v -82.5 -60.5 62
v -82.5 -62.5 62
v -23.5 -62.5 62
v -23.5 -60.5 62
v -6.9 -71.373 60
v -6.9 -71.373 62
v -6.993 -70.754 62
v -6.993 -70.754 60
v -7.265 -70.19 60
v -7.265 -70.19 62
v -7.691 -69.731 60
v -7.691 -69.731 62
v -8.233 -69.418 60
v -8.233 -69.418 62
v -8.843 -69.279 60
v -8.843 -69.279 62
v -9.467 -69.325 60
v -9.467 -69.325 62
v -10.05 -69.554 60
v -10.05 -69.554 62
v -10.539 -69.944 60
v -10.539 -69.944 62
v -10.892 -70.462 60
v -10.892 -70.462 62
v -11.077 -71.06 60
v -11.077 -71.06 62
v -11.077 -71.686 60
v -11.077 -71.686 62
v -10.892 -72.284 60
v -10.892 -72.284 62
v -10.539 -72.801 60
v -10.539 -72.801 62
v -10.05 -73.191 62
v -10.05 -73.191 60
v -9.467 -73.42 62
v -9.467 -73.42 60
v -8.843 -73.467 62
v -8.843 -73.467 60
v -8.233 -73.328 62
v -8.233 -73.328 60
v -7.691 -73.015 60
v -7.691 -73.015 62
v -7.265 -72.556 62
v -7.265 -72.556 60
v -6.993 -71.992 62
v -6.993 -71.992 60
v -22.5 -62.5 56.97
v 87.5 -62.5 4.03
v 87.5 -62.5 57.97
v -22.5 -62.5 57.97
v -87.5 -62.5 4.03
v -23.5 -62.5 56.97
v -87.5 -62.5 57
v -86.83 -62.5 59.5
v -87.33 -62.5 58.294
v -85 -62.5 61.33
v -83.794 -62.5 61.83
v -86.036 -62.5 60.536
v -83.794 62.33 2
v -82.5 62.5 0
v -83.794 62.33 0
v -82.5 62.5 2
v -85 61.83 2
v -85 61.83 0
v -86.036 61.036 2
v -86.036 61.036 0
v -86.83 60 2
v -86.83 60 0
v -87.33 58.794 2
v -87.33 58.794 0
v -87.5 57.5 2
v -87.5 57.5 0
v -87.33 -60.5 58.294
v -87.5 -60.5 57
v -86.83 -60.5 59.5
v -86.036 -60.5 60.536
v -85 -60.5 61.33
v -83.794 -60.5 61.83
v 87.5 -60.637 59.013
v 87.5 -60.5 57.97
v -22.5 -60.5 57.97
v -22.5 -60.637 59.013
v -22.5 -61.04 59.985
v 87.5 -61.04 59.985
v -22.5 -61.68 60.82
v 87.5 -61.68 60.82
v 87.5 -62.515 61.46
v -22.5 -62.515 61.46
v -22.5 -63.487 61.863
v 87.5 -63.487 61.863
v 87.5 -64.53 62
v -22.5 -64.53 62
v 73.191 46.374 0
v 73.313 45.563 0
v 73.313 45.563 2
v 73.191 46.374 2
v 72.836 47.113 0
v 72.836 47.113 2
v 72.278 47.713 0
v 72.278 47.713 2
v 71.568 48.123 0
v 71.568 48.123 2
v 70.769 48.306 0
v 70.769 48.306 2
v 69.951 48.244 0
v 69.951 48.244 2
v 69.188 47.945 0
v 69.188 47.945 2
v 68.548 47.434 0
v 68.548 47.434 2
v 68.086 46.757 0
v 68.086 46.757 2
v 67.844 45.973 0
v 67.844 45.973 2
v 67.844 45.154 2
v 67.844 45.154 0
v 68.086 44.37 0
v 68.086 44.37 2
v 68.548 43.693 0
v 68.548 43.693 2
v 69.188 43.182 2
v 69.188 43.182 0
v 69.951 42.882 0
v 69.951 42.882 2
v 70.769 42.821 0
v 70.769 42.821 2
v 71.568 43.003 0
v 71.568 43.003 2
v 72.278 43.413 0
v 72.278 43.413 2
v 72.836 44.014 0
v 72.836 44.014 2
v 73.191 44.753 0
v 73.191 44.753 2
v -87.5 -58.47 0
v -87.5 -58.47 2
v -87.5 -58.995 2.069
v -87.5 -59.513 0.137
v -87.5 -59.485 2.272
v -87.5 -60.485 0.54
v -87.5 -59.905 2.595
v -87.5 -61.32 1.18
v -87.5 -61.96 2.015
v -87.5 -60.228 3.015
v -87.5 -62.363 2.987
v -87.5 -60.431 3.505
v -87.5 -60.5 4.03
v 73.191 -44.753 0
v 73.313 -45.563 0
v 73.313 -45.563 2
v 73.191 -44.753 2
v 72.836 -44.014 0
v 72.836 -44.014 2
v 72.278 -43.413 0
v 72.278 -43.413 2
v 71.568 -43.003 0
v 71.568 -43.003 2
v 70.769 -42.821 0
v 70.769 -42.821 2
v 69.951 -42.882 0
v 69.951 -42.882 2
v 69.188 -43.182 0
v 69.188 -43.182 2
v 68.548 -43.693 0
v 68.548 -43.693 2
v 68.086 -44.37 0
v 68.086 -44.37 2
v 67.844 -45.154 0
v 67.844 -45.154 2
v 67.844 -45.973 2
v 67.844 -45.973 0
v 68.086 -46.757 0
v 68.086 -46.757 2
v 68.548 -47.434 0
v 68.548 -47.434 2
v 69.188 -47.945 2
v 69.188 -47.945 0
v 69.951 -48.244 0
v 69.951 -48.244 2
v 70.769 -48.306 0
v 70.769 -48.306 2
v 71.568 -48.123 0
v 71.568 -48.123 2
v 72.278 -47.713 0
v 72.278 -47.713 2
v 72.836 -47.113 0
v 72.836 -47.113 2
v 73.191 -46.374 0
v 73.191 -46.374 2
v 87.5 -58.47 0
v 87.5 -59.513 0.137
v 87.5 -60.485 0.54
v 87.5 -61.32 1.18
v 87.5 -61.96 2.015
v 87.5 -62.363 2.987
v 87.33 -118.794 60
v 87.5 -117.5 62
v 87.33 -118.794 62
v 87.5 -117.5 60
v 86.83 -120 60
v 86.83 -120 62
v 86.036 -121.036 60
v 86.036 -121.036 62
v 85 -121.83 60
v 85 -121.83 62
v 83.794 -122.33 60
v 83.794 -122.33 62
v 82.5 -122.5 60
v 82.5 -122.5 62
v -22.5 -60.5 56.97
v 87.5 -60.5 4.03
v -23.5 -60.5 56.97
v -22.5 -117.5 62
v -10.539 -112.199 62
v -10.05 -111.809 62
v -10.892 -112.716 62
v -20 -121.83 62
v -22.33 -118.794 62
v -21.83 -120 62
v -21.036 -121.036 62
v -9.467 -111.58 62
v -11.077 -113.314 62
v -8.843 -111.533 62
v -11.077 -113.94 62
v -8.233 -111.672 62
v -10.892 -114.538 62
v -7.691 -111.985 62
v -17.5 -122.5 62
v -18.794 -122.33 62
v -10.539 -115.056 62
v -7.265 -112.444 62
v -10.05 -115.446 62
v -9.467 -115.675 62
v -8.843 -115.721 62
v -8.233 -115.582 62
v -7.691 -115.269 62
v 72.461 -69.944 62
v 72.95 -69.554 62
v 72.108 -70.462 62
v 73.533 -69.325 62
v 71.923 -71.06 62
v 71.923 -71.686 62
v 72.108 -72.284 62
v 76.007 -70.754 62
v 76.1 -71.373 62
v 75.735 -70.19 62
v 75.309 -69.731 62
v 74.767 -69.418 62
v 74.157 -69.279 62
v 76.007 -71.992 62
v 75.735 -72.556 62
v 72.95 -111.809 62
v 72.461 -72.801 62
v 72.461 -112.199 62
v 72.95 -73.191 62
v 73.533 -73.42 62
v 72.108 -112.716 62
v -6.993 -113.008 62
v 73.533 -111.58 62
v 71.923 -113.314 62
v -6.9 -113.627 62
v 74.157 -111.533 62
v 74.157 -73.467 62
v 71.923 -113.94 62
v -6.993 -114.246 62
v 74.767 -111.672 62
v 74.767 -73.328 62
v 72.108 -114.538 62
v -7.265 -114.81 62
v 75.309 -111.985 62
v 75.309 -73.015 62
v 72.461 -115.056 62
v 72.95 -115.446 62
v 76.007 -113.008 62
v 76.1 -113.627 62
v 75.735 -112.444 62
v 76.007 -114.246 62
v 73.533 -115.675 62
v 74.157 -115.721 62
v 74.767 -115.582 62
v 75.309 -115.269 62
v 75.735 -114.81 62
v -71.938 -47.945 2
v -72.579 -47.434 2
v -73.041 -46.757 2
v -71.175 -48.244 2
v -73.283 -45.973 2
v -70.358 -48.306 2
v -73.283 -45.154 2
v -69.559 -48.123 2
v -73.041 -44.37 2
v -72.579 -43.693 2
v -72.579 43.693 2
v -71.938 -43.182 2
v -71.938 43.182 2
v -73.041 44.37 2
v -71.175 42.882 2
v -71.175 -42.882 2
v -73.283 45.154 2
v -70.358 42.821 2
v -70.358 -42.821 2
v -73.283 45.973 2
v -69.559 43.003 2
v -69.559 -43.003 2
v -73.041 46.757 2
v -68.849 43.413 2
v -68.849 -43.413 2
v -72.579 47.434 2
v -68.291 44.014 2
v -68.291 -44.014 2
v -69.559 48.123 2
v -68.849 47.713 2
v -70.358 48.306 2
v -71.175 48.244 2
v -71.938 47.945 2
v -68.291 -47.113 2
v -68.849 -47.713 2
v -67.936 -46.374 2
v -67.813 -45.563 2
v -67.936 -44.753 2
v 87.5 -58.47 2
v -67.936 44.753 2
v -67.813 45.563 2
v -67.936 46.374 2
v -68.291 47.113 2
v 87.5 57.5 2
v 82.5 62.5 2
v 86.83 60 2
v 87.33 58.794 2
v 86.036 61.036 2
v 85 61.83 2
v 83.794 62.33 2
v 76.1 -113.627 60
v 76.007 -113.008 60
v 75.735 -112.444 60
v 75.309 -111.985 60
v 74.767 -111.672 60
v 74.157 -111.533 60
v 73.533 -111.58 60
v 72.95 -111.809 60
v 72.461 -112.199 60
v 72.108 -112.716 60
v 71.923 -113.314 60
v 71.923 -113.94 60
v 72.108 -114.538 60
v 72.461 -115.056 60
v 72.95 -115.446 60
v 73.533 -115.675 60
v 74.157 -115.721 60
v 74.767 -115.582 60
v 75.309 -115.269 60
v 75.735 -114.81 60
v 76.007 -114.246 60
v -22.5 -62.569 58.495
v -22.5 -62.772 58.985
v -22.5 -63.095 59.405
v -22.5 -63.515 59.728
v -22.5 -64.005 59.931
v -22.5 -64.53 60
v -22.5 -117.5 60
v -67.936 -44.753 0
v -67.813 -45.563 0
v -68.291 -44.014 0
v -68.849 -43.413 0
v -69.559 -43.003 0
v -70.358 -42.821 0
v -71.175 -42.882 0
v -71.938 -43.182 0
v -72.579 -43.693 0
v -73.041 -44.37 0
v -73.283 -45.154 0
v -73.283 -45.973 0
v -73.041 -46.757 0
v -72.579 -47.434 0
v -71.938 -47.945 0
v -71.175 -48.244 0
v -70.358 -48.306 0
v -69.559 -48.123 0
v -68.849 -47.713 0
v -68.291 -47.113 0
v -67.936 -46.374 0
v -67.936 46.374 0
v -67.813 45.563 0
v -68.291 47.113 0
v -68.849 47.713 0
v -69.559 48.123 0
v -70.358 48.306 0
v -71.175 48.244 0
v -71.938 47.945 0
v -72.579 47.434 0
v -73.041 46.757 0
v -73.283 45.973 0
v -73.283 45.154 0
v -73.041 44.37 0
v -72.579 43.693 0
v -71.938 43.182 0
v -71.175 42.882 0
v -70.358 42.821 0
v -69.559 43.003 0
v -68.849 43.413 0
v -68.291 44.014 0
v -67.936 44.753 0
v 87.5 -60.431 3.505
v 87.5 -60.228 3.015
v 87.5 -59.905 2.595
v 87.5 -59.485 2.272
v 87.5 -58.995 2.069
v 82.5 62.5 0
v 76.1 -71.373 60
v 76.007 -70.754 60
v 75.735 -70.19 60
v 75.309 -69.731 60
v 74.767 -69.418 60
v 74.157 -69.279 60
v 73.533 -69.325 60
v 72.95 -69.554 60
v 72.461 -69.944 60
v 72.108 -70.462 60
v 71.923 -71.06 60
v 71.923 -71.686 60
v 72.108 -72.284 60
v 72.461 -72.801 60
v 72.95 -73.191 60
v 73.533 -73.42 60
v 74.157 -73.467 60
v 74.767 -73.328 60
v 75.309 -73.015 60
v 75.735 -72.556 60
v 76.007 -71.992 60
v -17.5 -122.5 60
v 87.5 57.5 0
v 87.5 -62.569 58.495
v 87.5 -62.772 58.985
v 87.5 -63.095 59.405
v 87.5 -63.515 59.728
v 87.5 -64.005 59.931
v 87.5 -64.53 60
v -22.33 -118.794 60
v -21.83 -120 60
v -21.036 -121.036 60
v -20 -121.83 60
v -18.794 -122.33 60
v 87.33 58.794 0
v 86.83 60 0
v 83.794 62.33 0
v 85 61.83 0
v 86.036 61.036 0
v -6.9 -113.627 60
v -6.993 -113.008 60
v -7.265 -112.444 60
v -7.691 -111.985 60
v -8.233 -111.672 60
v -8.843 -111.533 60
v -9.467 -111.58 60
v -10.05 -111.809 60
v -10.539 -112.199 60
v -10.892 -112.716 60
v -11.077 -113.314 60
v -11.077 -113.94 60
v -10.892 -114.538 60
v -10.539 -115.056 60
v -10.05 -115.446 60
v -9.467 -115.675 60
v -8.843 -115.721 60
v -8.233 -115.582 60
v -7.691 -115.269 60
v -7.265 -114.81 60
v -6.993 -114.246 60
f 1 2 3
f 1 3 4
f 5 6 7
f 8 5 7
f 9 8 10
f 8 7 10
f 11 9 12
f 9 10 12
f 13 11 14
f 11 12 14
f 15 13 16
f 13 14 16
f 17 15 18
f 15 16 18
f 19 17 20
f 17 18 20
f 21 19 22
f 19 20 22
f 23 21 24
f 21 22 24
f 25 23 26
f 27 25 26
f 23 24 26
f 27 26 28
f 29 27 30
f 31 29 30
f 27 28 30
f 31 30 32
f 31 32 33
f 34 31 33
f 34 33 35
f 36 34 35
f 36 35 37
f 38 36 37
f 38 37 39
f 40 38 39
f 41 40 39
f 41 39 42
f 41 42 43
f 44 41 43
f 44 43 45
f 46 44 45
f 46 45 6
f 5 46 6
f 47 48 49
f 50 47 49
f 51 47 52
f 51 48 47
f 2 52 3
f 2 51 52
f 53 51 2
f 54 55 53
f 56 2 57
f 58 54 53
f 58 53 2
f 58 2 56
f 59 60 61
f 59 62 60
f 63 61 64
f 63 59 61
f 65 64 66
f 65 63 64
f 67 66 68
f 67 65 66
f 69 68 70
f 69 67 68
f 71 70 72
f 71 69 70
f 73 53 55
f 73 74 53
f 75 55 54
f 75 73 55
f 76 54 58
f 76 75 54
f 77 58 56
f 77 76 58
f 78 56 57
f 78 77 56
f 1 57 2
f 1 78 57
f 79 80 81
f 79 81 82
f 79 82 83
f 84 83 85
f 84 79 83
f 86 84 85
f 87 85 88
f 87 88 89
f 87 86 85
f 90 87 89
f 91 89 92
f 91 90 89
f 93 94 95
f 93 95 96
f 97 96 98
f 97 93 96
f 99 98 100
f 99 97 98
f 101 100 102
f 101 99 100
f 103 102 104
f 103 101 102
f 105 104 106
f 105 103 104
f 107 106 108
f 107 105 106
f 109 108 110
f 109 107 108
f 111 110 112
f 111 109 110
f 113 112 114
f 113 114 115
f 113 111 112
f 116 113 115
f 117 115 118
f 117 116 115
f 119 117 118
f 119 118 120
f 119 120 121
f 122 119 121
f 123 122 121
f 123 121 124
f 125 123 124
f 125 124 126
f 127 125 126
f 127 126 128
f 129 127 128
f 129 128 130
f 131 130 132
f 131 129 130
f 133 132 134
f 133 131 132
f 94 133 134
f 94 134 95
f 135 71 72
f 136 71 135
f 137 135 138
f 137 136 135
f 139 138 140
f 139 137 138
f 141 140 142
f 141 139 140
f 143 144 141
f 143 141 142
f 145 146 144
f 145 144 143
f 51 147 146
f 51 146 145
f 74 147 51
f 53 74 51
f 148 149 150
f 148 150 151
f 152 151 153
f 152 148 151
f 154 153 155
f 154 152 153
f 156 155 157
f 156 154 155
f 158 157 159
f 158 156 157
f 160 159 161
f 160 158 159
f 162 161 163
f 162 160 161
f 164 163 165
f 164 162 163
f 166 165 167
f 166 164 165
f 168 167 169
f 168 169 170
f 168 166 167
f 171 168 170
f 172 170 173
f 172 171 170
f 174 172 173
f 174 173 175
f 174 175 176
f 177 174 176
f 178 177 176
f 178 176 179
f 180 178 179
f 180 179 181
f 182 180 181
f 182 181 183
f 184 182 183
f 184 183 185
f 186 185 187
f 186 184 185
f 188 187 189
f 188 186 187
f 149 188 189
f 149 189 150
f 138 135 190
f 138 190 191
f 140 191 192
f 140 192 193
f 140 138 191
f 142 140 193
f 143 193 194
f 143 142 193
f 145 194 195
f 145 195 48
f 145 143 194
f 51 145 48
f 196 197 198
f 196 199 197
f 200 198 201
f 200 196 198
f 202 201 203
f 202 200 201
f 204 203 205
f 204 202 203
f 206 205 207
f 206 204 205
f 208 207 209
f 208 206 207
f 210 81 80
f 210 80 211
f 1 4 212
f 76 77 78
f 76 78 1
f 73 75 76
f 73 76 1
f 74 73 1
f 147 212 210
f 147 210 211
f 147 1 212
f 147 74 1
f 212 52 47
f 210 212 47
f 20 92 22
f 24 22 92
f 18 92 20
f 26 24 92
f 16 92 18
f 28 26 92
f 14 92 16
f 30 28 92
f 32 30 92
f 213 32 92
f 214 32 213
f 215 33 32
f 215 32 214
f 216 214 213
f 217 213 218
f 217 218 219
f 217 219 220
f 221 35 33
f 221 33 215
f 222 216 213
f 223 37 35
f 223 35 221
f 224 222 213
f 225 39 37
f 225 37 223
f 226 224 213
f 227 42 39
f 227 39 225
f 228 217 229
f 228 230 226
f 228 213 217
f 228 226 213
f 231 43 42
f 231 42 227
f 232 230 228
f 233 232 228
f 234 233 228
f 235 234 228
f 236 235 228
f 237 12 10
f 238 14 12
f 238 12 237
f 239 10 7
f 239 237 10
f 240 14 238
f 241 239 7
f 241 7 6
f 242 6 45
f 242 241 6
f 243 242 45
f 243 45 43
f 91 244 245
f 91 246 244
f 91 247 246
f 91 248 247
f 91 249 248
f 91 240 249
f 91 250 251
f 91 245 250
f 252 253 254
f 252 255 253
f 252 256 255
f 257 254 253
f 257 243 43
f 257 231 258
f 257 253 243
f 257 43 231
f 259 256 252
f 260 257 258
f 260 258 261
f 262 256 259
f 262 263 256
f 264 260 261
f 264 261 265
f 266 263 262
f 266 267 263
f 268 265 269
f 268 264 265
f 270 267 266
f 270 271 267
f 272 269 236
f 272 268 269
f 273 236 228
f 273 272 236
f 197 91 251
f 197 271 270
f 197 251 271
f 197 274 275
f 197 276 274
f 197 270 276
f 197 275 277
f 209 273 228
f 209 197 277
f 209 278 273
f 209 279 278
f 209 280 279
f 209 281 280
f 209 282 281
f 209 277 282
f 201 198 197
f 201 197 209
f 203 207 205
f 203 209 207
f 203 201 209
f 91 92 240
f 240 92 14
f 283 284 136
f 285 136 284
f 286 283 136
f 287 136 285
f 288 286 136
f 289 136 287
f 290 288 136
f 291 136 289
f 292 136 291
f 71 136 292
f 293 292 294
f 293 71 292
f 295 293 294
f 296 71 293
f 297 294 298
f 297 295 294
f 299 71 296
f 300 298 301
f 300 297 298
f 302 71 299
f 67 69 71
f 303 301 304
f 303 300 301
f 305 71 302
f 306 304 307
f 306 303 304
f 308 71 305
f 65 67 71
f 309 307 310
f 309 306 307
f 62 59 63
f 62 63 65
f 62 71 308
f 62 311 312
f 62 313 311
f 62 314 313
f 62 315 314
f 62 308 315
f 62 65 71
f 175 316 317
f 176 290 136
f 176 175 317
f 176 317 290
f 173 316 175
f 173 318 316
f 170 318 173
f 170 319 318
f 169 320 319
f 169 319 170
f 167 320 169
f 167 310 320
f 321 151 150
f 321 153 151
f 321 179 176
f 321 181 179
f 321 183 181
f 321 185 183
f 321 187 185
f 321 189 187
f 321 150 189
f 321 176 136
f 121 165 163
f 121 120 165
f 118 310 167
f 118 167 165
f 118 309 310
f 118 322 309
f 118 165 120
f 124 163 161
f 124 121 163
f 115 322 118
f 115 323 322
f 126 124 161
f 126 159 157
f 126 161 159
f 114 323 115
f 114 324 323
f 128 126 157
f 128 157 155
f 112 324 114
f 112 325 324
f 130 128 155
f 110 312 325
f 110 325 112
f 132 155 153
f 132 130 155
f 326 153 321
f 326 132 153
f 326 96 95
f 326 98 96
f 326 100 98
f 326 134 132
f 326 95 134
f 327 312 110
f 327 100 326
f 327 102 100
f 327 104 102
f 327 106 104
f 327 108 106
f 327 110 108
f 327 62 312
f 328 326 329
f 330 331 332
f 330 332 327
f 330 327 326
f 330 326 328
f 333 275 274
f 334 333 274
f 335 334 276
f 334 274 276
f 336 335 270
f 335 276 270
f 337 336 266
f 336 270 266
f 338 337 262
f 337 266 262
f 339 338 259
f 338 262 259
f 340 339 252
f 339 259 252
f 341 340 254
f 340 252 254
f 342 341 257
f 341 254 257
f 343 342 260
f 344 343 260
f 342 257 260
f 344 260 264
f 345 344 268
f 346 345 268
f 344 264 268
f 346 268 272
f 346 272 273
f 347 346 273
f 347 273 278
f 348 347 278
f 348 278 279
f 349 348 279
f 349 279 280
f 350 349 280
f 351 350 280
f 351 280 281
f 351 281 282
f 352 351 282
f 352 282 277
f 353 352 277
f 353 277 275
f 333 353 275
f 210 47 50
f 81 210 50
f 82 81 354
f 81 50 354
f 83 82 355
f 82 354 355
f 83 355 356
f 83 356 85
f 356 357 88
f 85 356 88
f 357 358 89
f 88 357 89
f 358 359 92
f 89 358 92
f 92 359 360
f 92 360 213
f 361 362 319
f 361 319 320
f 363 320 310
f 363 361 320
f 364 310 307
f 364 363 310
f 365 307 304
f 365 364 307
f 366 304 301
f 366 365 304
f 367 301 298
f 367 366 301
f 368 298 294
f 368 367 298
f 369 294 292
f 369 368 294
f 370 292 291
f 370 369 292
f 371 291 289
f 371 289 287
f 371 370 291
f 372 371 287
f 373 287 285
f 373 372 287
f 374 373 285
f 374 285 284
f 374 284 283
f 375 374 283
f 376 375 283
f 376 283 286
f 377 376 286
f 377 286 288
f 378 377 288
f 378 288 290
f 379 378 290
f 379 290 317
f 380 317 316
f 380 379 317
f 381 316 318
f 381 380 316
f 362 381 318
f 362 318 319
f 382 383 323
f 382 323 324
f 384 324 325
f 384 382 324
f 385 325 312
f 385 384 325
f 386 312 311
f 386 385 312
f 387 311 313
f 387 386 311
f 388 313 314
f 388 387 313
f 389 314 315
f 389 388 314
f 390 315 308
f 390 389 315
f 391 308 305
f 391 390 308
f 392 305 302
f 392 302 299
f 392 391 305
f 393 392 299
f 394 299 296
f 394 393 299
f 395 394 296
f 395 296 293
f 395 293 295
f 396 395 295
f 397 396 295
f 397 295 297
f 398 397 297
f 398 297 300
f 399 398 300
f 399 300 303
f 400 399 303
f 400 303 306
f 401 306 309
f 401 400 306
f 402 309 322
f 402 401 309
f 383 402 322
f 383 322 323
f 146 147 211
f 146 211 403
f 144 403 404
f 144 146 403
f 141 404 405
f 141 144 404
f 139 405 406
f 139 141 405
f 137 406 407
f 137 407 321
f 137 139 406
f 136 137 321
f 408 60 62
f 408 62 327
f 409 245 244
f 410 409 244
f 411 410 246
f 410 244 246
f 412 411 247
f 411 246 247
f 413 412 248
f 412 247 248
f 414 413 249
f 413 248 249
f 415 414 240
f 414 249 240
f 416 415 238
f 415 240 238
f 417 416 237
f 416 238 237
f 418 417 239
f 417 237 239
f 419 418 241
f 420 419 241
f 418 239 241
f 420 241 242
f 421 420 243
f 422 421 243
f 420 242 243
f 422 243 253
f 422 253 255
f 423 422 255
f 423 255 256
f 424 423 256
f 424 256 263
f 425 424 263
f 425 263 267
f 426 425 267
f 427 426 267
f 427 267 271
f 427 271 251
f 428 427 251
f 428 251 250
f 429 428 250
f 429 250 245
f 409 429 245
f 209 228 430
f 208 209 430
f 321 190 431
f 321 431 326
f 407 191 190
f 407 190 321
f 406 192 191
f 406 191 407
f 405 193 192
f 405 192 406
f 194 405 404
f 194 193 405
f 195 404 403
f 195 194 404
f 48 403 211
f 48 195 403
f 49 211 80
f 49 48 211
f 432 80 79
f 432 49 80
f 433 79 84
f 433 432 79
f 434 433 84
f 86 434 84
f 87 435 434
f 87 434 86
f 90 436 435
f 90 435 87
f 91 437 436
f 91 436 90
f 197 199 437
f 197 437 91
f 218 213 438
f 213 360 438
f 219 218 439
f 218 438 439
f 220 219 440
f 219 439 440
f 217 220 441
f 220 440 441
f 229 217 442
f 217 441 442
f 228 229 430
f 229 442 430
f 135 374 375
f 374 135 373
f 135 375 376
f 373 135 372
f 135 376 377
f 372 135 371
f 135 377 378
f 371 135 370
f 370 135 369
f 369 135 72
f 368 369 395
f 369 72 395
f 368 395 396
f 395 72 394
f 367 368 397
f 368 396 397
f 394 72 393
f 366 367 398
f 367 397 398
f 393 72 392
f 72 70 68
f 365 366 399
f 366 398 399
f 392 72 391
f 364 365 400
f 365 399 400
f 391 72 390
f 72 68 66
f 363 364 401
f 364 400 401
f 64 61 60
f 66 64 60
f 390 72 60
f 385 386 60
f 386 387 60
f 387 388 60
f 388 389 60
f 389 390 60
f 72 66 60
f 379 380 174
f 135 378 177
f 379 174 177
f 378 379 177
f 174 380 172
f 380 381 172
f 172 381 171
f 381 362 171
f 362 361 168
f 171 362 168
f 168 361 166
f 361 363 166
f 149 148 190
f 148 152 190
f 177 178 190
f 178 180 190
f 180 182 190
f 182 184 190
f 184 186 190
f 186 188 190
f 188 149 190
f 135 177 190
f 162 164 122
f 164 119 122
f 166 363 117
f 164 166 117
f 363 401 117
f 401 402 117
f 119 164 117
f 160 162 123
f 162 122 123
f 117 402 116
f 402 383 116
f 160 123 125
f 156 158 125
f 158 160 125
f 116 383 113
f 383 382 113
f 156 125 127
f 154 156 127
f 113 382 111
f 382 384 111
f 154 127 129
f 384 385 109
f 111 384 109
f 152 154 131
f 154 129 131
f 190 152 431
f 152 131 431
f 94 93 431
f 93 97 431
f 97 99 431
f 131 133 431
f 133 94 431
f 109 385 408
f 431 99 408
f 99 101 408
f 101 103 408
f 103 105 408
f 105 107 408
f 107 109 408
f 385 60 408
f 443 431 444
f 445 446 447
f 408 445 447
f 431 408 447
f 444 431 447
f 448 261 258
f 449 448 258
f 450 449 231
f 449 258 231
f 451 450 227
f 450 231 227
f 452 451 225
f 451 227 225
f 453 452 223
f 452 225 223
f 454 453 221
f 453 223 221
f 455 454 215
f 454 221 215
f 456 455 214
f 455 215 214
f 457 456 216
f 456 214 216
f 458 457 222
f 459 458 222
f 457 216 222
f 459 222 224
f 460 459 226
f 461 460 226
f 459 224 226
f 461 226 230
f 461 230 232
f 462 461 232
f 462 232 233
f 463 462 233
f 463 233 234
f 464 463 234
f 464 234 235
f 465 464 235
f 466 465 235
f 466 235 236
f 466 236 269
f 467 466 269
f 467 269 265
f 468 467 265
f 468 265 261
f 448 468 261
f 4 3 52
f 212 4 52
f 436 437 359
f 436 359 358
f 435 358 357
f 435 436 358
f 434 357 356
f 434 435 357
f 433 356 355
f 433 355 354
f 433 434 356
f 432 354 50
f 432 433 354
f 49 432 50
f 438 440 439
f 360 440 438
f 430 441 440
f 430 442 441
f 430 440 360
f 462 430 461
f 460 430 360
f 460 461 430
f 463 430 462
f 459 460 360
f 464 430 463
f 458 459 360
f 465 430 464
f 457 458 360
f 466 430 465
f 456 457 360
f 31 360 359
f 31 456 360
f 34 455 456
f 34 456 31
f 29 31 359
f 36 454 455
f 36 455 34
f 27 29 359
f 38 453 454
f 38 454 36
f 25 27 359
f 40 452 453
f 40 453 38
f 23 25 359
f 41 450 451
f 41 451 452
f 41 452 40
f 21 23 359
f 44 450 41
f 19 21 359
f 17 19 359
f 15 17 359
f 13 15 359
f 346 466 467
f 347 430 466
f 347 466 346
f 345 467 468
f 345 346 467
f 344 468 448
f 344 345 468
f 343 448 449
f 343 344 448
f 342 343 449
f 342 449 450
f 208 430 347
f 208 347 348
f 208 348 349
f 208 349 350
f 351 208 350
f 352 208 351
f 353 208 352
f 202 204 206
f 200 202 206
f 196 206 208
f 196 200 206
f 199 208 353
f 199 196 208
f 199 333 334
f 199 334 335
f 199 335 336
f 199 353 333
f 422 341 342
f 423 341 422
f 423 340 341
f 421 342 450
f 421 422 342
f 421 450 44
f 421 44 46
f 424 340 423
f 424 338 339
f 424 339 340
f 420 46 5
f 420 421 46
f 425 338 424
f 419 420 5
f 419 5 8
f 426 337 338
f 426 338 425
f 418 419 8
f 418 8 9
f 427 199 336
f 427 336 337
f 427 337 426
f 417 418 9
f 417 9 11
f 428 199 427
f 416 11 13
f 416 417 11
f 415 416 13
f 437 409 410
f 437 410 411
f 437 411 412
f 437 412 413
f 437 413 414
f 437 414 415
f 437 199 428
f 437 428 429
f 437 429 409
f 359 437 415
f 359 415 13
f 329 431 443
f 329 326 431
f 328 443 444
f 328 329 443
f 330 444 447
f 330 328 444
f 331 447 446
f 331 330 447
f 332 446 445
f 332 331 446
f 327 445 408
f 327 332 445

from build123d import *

# Parameters (mm, degrees)
SKETCH1_W                     = 175
SKETCH1_H                     = 125
SKETCH1_R                     = 2.75
BASE_FLANGE1_DEPTH            = 2
EDGE_FLANGE1_STRIP_W          = 12.06
EDGE_FLANGE1_STRIP_H          = 2
EDGE_FLANGE1_STRIP_CUT_DEPTH  = 175
EDGE_FLANGE1_DEPTH            = 175
EDGE_FLANGE3_STRIP_W          = 12.06
EDGE_FLANGE3_STRIP_H          = 2
EDGE_FLANGE3_STRIP_CUT_DEPTH  = 110
EDGE_FLANGE3_RELIEF_W         = 13.06
EDGE_FLANGE3_RELIEF_H         = 1
EDGE_FLANGE3_RELIEF_CUT_DEPTH = 2
EDGE_FLANGE3_DEPTH            = 110
CUT_EXTRUDE2_REACH            = 164.808
SKETCH18_R                    = 2.1
FILLET1_R                     = 5


# Sheet-metal steps are written as plain solids
with BuildPart() as part:
    # Sketch1 → Base-Flange1 (new body)
    with BuildSketch(Plane.XY):
        Rectangle(SKETCH1_W, SKETCH1_H)
        with Locations((70.5634, 45.5634)):
            Circle(SKETCH1_R, mode=Mode.SUBTRACT)
        with Locations((70.5634, -45.5634)):
            Circle(SKETCH1_R, mode=Mode.SUBTRACT)
        with Locations((-70.5634, 45.5634)):
            Circle(SKETCH1_R, mode=Mode.SUBTRACT)
        with Locations((-70.5634, -45.5634)):
            Circle(SKETCH1_R, mode=Mode.SUBTRACT)
    extrude(amount=BASE_FLANGE1_DEPTH)

    # Edge-Flange1 strip (across the edge) → Edge-Flange1 strip cut (cut)
    with BuildSketch(Plane(origin=(-87.5, -62.5, 2), x_dir=(0, 1, 0), z_dir=(1, 0, 0))):
        with Locations((-2, -1)):
            Rectangle(EDGE_FLANGE1_STRIP_W, EDGE_FLANGE1_STRIP_H)
    extrude(amount=EDGE_FLANGE1_STRIP_CUT_DEPTH, mode=Mode.SUBTRACT)

    # Edge-Flange1 section (across the edge) → Edge-Flange1 (add)
    with BuildSketch(Plane(origin=(-87.5, -62.5, 2), x_dir=(0, 1, 0), z_dir=(1, 0, 0))):
        with BuildLine():
            Line((0, 2.03), (0, 60))
            Line((0, 60), (2, 60))
            Line((2, 60), (2, 2.03))
            ThreePointArc((2, 2.03), (2.594573234, 0.594573234), (4.03, 0))
            Line((4.03, 0), (4.03, -2))
            ThreePointArc((4.03, -2), (1.180359672, -0.819640328), (0, 2.03))
        make_face()
    extrude(amount=EDGE_FLANGE1_DEPTH)

    # Edge-Flange3 strip (across the edge) → Edge-Flange3 strip cut (cut)
    with BuildSketch(Plane(origin=(87.5, -62.5, 62), x_dir=(0, 0, -1), z_dir=(-1, 0, 0))):
        with Locations((-2, -1)):
            Rectangle(EDGE_FLANGE3_STRIP_W, EDGE_FLANGE3_STRIP_H)
    extrude(amount=EDGE_FLANGE3_STRIP_CUT_DEPTH, mode=Mode.SUBTRACT)

    # Edge-Flange3 relief (on the sheet) → Edge-Flange3 relief cut (cut)
    with BuildSketch(Plane(origin=(87.5, -62.5, 57.97), x_dir=(0, 0, -1), z_dir=(0, -1, 0))):
        with Locations((-5.53, -110.5)):
            Rectangle(EDGE_FLANGE3_RELIEF_W, EDGE_FLANGE3_RELIEF_H)
    extrude(amount=-EDGE_FLANGE3_RELIEF_CUT_DEPTH, mode=Mode.SUBTRACT)

    # Edge-Flange3 section (across the edge) → Edge-Flange3 (add)
    with BuildSketch(Plane(origin=(87.5, -62.5, 62), x_dir=(0, 0, -1), z_dir=(-1, 0, 0))):
        with BuildLine():
            Line((0, 2.03), (0, 60))
            Line((0, 60), (2, 60))
            Line((2, 60), (2, 2.03))
            ThreePointArc((2, 2.03), (2.594573234, 0.594573234), (4.03, 0))
            Line((4.03, 0), (4.03, -2))
            ThreePointArc((4.03, -2), (1.180359672, -0.819640328), (0, 2.03))
        make_face()
    extrude(amount=EDGE_FLANGE3_DEPTH)

    # Sketch18 → Cut-Extrude2 (cut, up to next)
    with BuildSketch(Plane.XY.offset(62), mode=Mode.PRIVATE) as cut_extrude2_sk1:
        with Locations((-9, -71.372677549)):
            Circle(SKETCH18_R)
    cut_extrude2_tool1 = extrude(cut_extrude2_sk1.sketch, amount=-CUT_EXTRUDE2_REACH, mode=Mode.PRIVATE) & part.part
    # Sketch18 → Cut-Extrude2 (cut, up to next)
    with BuildSketch(Plane.XY.offset(62), mode=Mode.PRIVATE) as cut_extrude2_sk2:
        with Locations((-9, -113.627322451)):
            Circle(SKETCH18_R)
    cut_extrude2_tool2 = extrude(cut_extrude2_sk2.sketch, amount=-CUT_EXTRUDE2_REACH, mode=Mode.PRIVATE) & part.part
    # Sketch18 → Cut-Extrude2 (cut, up to next)
    with BuildSketch(Plane.XY.offset(62), mode=Mode.PRIVATE) as cut_extrude2_sk3:
        with Locations((74, -71.372677549)):
            Circle(SKETCH18_R)
    cut_extrude2_tool3 = extrude(cut_extrude2_sk3.sketch, amount=-CUT_EXTRUDE2_REACH, mode=Mode.PRIVATE) & part.part
    # Sketch18 → Cut-Extrude2 (cut, up to next)
    with BuildSketch(Plane.XY.offset(62), mode=Mode.PRIVATE) as cut_extrude2_sk4:
        with Locations((74, -113.627322451)):
            Circle(SKETCH18_R)
    cut_extrude2_tool4 = extrude(cut_extrude2_sk4.sketch, amount=-CUT_EXTRUDE2_REACH, mode=Mode.PRIVATE) & part.part
    add(cut_extrude2_tool1.solids().sort_by_distance((-9, -71.372678, 62))[0], mode=Mode.SUBTRACT)
    add(cut_extrude2_tool2.solids().sort_by_distance((-9, -113.627322, 62))[0], mode=Mode.SUBTRACT)
    add(cut_extrude2_tool3.solids().sort_by_distance((74, -71.372678, 62))[0], mode=Mode.SUBTRACT)
    add(cut_extrude2_tool4.solids().sort_by_distance((74, -113.627322, 62))[0], mode=Mode.SUBTRACT)

    # Fillet1
    fillet1_edges = [part.edges().sort_by_distance(p)[0] for p in [
        (-87.5, -61.5, 62),
        (87.5, 62.5, 1),
        (-87.5, 62.5, 1),
        (87.5, -122.5, 61),
        (-22.5, -122.5, 61),
    ]]
    fillet(fillet1_edges, radius=FILLET1_R)


solid = part.part
